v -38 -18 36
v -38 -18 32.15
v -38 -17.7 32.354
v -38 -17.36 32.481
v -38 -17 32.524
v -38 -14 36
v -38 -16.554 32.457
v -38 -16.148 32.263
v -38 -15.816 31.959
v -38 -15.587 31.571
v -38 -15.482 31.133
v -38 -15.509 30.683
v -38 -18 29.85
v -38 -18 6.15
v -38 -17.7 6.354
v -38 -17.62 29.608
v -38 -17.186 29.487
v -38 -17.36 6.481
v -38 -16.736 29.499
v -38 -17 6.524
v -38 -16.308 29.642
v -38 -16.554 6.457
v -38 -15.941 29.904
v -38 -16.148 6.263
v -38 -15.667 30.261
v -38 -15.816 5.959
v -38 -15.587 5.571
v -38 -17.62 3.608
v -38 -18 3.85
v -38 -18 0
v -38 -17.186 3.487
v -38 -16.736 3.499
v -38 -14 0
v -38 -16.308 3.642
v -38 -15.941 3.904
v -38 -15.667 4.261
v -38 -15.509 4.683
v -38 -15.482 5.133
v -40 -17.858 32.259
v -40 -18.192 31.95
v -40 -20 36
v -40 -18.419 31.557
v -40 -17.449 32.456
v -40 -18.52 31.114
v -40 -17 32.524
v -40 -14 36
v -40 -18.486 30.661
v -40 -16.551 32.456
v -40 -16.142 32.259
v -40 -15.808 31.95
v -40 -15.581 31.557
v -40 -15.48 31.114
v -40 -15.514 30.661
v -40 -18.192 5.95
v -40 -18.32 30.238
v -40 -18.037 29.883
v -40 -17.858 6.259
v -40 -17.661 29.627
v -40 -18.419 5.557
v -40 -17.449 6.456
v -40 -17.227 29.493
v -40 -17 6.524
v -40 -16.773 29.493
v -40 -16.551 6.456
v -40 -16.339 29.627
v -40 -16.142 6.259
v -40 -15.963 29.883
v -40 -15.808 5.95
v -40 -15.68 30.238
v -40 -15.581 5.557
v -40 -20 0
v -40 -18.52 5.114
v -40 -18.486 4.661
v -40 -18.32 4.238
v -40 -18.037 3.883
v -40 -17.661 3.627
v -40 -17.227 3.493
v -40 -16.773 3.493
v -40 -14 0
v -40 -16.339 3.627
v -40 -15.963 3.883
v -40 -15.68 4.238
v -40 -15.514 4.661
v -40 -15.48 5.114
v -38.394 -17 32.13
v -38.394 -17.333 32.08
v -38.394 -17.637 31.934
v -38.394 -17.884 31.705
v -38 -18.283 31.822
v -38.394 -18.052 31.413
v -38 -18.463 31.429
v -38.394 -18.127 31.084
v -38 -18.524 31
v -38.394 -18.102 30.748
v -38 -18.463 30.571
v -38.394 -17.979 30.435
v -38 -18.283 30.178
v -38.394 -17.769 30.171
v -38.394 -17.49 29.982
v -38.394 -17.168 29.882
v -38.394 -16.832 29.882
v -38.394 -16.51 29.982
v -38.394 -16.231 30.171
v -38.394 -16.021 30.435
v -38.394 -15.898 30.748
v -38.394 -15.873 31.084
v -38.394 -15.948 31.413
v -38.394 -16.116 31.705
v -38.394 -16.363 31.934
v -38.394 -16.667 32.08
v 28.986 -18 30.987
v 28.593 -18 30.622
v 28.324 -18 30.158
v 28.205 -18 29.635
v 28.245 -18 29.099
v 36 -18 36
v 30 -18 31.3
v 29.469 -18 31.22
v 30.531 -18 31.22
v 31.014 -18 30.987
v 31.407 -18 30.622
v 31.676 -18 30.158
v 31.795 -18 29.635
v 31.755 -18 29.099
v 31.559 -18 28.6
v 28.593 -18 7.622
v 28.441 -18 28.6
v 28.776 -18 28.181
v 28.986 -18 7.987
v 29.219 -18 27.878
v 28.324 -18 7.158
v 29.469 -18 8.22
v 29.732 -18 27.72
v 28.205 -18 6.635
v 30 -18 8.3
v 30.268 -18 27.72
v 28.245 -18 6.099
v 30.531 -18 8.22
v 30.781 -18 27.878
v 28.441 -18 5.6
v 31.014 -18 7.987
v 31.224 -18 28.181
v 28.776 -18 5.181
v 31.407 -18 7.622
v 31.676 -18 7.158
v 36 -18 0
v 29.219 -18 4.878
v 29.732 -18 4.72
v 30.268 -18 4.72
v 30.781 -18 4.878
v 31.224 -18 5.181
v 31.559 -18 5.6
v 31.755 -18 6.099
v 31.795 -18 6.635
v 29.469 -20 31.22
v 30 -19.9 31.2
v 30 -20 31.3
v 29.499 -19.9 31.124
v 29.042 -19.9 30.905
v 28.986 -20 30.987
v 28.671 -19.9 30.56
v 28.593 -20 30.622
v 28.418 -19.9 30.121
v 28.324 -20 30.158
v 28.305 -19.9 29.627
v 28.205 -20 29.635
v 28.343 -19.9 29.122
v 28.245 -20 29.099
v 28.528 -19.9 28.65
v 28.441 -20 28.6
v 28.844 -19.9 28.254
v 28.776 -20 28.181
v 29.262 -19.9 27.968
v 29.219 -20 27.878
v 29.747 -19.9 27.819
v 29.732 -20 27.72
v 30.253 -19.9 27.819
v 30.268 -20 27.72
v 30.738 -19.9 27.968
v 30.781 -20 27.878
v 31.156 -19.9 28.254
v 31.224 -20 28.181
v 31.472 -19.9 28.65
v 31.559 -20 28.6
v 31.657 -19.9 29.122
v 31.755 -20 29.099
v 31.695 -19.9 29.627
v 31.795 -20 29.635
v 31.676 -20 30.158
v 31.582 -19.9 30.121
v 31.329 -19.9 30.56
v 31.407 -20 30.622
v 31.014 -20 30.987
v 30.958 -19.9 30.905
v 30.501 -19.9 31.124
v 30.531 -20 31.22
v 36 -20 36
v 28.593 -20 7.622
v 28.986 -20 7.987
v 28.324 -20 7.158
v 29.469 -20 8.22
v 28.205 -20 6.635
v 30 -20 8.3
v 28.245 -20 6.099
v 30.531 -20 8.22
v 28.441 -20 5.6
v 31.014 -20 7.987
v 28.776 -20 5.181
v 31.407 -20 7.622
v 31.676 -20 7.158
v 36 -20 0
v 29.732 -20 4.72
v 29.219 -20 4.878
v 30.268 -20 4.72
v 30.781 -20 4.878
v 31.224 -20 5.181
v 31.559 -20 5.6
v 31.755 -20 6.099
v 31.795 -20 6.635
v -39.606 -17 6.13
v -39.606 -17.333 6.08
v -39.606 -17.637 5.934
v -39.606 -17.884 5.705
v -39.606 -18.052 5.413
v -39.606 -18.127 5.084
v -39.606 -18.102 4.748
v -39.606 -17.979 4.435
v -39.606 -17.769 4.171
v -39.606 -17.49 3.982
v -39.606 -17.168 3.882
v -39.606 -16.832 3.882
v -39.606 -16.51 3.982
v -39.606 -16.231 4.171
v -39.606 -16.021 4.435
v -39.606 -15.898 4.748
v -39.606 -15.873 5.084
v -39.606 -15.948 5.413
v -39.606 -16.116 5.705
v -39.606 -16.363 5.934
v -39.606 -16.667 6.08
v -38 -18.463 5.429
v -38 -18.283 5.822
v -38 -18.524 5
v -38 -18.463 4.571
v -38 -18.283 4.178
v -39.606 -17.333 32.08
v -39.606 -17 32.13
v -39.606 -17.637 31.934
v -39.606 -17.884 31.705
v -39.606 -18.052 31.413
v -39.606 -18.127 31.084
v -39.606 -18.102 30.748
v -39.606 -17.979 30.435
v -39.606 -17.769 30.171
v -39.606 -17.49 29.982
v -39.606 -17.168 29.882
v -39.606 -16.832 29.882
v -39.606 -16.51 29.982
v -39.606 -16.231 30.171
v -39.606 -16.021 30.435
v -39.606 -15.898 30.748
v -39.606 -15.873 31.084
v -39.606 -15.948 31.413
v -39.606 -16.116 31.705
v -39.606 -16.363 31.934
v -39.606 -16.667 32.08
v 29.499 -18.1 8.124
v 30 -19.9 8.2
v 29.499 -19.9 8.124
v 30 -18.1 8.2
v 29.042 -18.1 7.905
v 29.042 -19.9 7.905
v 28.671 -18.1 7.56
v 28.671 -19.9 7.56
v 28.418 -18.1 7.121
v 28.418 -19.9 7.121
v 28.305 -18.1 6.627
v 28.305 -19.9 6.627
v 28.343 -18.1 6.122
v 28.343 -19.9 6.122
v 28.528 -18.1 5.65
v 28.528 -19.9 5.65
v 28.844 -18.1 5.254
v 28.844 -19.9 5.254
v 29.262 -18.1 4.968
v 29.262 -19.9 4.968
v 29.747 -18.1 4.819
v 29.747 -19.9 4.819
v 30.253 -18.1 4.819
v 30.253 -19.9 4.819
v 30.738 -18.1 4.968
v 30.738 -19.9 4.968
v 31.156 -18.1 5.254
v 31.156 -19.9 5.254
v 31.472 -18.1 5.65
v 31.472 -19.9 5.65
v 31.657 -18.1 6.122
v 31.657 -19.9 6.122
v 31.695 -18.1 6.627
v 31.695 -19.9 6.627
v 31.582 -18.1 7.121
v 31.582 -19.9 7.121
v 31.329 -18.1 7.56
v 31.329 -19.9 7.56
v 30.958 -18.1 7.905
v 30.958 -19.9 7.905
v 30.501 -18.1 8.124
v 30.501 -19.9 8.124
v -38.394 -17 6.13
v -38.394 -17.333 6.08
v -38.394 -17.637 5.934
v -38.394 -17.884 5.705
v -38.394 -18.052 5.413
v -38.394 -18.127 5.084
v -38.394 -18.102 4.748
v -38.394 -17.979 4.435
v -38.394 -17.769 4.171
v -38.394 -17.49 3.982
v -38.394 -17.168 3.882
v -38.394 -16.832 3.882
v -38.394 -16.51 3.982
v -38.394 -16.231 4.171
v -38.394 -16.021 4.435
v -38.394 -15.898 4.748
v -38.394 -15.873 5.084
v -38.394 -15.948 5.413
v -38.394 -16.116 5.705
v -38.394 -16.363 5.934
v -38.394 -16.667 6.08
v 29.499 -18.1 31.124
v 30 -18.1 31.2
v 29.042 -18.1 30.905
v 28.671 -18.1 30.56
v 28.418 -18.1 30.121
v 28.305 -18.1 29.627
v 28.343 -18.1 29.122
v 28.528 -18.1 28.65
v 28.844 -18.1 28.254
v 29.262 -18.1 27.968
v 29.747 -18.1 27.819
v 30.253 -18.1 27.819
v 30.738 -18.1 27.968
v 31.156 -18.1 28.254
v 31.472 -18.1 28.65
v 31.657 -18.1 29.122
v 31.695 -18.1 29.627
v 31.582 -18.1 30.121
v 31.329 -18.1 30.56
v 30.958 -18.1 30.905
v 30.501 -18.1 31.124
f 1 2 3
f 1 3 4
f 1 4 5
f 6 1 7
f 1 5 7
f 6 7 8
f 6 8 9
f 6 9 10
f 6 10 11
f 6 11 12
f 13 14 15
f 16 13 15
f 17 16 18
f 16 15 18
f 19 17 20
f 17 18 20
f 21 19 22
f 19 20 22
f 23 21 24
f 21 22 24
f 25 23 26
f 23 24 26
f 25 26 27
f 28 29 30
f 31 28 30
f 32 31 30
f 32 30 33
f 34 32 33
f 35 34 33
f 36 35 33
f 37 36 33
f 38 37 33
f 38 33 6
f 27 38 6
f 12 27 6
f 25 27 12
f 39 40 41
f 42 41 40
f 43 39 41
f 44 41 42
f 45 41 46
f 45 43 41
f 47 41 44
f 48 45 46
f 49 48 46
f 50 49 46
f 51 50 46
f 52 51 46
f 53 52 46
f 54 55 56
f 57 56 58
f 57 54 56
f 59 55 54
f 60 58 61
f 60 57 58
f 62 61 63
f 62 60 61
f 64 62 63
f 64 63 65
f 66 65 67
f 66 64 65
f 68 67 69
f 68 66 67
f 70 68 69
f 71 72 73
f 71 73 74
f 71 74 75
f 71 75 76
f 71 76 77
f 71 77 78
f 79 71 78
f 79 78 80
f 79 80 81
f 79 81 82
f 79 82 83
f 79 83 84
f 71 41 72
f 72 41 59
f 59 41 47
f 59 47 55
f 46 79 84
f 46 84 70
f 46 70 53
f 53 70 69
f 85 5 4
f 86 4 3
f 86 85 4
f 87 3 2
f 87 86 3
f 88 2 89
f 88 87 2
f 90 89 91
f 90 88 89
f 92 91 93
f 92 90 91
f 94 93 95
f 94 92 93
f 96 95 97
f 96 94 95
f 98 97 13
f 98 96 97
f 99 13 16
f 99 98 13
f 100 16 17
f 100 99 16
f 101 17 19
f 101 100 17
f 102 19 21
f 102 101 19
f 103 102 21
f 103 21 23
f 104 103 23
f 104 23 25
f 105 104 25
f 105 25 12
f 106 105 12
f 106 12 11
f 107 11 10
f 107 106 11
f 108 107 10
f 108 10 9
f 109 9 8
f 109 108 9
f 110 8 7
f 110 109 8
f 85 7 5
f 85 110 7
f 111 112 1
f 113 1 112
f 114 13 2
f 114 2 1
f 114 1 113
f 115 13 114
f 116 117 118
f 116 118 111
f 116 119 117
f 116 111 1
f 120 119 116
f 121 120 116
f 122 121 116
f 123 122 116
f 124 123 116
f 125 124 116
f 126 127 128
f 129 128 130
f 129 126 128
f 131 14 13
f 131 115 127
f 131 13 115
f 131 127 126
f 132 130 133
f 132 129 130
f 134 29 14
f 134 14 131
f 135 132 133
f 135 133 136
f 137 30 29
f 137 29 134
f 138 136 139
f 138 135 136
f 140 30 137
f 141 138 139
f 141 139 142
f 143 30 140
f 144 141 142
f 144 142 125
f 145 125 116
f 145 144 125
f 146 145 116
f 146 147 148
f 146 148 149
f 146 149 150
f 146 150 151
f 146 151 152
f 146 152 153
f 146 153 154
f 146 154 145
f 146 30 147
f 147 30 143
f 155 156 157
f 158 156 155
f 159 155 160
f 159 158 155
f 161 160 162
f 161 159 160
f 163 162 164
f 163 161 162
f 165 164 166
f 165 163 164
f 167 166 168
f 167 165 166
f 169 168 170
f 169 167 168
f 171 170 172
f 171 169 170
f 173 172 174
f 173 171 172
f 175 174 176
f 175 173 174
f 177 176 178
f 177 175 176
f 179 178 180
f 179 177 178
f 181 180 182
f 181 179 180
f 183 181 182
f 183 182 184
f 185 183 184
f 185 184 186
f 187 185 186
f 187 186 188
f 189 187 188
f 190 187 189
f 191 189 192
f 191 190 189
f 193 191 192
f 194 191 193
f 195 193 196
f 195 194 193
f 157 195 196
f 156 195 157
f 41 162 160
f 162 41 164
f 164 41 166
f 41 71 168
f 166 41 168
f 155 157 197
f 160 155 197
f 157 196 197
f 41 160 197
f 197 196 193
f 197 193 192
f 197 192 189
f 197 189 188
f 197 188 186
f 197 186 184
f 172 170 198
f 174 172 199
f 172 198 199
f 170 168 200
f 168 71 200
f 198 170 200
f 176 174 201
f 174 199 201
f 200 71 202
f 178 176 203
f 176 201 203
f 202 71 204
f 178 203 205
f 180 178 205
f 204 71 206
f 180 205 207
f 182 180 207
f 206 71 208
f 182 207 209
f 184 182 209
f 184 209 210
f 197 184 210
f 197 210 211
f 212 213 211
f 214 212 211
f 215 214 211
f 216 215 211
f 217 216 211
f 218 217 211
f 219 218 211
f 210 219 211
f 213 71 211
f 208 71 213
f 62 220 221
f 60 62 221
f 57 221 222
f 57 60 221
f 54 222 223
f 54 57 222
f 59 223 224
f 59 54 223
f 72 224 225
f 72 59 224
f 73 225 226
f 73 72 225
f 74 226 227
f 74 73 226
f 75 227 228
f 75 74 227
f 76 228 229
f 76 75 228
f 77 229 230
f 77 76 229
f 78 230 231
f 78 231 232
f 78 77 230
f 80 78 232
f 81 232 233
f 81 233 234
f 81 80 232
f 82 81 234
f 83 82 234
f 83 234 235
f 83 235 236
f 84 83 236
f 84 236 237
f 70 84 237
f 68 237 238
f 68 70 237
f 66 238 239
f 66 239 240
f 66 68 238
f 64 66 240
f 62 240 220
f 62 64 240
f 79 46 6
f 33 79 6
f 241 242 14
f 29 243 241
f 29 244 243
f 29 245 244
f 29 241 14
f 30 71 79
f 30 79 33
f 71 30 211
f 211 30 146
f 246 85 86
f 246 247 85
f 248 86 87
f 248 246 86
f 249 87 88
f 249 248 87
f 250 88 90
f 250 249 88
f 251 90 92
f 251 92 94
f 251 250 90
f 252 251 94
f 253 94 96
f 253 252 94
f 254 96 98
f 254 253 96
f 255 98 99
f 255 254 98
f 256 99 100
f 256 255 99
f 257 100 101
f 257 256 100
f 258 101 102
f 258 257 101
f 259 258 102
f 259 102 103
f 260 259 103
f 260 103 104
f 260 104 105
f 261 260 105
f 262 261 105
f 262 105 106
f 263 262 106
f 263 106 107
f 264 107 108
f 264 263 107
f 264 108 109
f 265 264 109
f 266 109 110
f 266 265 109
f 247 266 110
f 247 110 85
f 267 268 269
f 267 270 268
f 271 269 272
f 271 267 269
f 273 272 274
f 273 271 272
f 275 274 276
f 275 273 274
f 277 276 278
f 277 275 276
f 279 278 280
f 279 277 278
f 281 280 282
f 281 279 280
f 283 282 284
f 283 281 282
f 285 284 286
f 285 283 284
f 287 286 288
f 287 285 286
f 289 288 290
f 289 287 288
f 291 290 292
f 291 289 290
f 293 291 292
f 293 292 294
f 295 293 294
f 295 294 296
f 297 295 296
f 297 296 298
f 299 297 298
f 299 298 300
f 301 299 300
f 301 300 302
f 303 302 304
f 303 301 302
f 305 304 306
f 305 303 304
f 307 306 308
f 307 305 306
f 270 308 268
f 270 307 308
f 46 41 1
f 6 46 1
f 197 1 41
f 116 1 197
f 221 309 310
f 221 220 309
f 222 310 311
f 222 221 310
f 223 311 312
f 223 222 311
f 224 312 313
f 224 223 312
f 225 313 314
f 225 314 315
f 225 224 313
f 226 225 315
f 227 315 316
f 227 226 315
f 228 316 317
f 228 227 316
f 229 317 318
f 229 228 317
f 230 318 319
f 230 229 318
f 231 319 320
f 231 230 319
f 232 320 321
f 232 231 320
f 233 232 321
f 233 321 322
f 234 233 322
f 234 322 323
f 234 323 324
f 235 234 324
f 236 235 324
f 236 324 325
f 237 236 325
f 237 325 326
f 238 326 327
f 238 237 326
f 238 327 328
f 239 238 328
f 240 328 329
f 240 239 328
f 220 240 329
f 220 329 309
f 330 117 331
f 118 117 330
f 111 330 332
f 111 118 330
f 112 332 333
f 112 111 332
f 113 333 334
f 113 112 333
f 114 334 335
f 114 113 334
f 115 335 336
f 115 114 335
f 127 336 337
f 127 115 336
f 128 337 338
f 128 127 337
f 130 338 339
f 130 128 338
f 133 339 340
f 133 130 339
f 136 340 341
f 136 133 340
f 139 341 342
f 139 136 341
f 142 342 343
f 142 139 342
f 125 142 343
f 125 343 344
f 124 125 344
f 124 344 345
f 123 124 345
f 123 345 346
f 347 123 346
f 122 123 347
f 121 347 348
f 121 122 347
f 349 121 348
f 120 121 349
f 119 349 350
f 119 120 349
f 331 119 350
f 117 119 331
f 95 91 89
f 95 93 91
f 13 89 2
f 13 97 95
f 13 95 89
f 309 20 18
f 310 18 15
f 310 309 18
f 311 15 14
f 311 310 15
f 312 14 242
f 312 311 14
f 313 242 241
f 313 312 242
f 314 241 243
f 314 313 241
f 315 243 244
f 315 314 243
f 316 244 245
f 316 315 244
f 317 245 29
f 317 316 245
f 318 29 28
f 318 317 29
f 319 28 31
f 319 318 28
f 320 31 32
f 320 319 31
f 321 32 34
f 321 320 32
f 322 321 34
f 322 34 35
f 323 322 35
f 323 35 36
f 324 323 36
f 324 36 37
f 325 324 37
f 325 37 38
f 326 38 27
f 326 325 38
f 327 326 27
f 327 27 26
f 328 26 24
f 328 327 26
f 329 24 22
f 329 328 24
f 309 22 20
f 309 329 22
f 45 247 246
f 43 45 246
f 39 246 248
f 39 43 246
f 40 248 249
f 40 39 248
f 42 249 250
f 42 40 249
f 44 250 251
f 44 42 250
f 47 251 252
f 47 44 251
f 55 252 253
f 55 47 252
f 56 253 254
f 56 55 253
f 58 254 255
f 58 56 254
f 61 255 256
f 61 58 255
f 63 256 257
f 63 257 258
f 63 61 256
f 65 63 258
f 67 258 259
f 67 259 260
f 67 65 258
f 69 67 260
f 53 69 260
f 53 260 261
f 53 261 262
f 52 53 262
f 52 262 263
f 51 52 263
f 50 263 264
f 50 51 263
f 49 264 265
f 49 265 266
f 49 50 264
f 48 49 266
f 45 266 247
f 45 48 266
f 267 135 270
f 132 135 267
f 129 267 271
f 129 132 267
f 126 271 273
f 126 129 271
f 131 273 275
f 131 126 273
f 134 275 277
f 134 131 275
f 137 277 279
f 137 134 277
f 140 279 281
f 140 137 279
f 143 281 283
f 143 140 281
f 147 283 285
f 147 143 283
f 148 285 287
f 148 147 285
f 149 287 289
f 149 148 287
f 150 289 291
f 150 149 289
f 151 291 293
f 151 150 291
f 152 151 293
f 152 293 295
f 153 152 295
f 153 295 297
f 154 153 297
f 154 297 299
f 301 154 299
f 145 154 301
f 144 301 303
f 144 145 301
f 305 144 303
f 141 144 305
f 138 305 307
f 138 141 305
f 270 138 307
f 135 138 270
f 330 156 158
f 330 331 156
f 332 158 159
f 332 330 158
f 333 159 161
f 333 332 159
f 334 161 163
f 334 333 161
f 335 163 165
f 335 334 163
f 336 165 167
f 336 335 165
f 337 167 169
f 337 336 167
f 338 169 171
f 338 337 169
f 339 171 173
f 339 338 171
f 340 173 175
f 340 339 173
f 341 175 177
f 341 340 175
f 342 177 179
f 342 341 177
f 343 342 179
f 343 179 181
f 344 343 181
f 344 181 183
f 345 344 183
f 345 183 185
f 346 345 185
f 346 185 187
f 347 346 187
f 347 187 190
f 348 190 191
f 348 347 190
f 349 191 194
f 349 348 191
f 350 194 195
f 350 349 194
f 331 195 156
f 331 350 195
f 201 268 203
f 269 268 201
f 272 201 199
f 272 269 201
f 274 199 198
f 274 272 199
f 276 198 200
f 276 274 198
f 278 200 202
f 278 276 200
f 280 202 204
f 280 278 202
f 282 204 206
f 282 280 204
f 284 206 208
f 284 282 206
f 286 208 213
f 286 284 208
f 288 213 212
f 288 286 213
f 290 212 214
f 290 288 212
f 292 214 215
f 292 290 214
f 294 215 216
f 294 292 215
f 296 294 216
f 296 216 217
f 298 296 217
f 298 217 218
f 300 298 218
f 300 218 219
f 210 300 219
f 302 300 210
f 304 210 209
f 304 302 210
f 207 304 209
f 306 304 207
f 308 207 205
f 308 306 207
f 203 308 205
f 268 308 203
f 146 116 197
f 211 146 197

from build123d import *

# Parameters (mm, degrees)
SKETCH_1_W                  = 80
SKETCH_1_H                  = 40
SKETCH_1_W_2                = 76
SKETCH_1_H_2                = 36
EXTRUDE_1_DEPTH             = 36
CUT_EXTRUDE_1_DEPTH         = 37
HOLE_WIZARD_4_40_AT_2_COUNT = 2
HOLE_WIZARD_4_40_AT_2_PITCH = 26
HOLE_WIZARD_M3_AT_2_COUNT   = 2
HOLE_WIZARD_M3_AT_2_PITCH   = 23


with BuildPart() as part:
    # Эскиз1 → Бобышка-Вытянуть1 (new body)
    with BuildSketch(Plane.XY):
        Rectangle(SKETCH_1_W, SKETCH_1_H)
        Rectangle(SKETCH_1_W_2, SKETCH_1_H_2, mode=Mode.SUBTRACT)
    extrude(amount=EXTRUDE_1_DEPTH)

    # Эскиз2 → Вырез-Вытянуть1 (cut, through all)
    with BuildSketch(Plane.XY.offset(36)):
        Polygon((-40, 20), (-40, -14), (-38, -14), (-38, 18), (38, 18), (38, -18), (36, -18), (36, -20), (40, -20), (40, 20), align=None)
    extrude(amount=-CUT_EXTRUDE_1_DEPTH, mode=Mode.SUBTRACT)

    # Эскиз3 → 4-40 (revolve, cut)
    with BuildSketch(Plane(origin=(-40, -17, 5), x_dir=(0, 0, 1), z_dir=(0, 1, 0))):
        Polygon((0, 0), (0, 2), (1.524, 2), (1.1303, 1.6063), (1.1303, 0.3937), (1.524, 0), align=None)
    hole_wizard_4_40 = revolve(axis=Axis((-46.35, -17, 5), (1, 0, 0)), mode=Mode.SUBTRACT)

    # 4-40 at 2: 4-40 ×2
    with Locations(*[(0, 0, i * HOLE_WIZARD_4_40_AT_2_PITCH) for i in range(1, HOLE_WIZARD_4_40_AT_2_COUNT)]):
        add(hole_wizard_4_40, mode=Mode.SUBTRACT)

    # Эскиз5 → Отверстие под  M3 (revolve, cut)
    with BuildSketch(Plane(origin=(30, -18, 6.5), x_dir=(0, 0, 1), z_dir=(1, 0, 0))):
        Polygon((0, 0), (0, 2), (1.8, 2), (1.7, 1.9), (1.7, 0.1), (1.8, 0), align=None)
    hole_wizard_m3 = revolve(axis=Axis((30, -11.65, 6.5), (0, -1, 0)), mode=Mode.SUBTRACT)

    # Отверстие под  M3 at 2: Отверстие под  M3 ×2
    with Locations(*[(0, 0, i * HOLE_WIZARD_M3_AT_2_PITCH) for i in range(1, HOLE_WIZARD_M3_AT_2_COUNT)]):
        add(hole_wizard_m3, mode=Mode.SUBTRACT)


solid = part.part
